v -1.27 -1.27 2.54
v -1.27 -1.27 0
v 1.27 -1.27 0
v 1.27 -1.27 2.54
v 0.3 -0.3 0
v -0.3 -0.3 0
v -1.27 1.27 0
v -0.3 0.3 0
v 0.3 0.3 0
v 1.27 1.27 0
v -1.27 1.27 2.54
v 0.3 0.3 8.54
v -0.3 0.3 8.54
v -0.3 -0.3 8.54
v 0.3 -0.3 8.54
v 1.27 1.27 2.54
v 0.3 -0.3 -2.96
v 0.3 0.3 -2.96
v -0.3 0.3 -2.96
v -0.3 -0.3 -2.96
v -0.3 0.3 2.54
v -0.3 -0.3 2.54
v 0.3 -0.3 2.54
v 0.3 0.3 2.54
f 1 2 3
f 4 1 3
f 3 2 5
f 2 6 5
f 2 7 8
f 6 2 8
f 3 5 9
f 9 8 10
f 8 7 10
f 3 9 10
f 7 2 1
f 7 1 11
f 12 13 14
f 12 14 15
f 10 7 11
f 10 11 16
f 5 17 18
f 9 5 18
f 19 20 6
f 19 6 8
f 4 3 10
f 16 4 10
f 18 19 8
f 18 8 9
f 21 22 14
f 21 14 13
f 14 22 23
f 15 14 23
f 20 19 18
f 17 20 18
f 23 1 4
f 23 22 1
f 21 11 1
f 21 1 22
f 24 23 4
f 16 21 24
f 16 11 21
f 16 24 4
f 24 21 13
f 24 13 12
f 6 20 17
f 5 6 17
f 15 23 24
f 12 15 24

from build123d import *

# Parameters (mm, degrees)
CROQUIS1_W                   = 2.54
CROQUIS1_H                   = 2.54
CROQUIS1_W_2                 = 0.6
CROQUIS1_H_2                 = 0.6
SALIENTE_EXTRUIR1_DEPTH      = 2.54
SALIENTE_EXTRUIR2_DEPTH      = 6
SALIENTE_EXTRUIR2_DEPTH_BACK = 5.5
CROQUIS2_W                   = 0.6
CROQUIS2_H                   = 0.6


with BuildPart() as part:
    # Croquis1 → Saliente-Extruir1 (new body)
    with BuildSketch(Plane.XY):
        Rectangle(CROQUIS1_W, CROQUIS1_H)
        Rectangle(CROQUIS1_W_2, CROQUIS1_H_2, mode=Mode.SUBTRACT)
    extrude(amount=SALIENTE_EXTRUIR1_DEPTH)

    # Croquis2 → Saliente-Extruir2 (add, two sides: drawn at the far end of the back side and taken through both)
    with BuildSketch(Plane.XY.offset(2.54).offset(-SALIENTE_EXTRUIR2_DEPTH_BACK)):
        Rectangle(CROQUIS2_W, CROQUIS2_H)
    extrude(amount=SALIENTE_EXTRUIR2_DEPTH + SALIENTE_EXTRUIR2_DEPTH_BACK)


solid = part.part
